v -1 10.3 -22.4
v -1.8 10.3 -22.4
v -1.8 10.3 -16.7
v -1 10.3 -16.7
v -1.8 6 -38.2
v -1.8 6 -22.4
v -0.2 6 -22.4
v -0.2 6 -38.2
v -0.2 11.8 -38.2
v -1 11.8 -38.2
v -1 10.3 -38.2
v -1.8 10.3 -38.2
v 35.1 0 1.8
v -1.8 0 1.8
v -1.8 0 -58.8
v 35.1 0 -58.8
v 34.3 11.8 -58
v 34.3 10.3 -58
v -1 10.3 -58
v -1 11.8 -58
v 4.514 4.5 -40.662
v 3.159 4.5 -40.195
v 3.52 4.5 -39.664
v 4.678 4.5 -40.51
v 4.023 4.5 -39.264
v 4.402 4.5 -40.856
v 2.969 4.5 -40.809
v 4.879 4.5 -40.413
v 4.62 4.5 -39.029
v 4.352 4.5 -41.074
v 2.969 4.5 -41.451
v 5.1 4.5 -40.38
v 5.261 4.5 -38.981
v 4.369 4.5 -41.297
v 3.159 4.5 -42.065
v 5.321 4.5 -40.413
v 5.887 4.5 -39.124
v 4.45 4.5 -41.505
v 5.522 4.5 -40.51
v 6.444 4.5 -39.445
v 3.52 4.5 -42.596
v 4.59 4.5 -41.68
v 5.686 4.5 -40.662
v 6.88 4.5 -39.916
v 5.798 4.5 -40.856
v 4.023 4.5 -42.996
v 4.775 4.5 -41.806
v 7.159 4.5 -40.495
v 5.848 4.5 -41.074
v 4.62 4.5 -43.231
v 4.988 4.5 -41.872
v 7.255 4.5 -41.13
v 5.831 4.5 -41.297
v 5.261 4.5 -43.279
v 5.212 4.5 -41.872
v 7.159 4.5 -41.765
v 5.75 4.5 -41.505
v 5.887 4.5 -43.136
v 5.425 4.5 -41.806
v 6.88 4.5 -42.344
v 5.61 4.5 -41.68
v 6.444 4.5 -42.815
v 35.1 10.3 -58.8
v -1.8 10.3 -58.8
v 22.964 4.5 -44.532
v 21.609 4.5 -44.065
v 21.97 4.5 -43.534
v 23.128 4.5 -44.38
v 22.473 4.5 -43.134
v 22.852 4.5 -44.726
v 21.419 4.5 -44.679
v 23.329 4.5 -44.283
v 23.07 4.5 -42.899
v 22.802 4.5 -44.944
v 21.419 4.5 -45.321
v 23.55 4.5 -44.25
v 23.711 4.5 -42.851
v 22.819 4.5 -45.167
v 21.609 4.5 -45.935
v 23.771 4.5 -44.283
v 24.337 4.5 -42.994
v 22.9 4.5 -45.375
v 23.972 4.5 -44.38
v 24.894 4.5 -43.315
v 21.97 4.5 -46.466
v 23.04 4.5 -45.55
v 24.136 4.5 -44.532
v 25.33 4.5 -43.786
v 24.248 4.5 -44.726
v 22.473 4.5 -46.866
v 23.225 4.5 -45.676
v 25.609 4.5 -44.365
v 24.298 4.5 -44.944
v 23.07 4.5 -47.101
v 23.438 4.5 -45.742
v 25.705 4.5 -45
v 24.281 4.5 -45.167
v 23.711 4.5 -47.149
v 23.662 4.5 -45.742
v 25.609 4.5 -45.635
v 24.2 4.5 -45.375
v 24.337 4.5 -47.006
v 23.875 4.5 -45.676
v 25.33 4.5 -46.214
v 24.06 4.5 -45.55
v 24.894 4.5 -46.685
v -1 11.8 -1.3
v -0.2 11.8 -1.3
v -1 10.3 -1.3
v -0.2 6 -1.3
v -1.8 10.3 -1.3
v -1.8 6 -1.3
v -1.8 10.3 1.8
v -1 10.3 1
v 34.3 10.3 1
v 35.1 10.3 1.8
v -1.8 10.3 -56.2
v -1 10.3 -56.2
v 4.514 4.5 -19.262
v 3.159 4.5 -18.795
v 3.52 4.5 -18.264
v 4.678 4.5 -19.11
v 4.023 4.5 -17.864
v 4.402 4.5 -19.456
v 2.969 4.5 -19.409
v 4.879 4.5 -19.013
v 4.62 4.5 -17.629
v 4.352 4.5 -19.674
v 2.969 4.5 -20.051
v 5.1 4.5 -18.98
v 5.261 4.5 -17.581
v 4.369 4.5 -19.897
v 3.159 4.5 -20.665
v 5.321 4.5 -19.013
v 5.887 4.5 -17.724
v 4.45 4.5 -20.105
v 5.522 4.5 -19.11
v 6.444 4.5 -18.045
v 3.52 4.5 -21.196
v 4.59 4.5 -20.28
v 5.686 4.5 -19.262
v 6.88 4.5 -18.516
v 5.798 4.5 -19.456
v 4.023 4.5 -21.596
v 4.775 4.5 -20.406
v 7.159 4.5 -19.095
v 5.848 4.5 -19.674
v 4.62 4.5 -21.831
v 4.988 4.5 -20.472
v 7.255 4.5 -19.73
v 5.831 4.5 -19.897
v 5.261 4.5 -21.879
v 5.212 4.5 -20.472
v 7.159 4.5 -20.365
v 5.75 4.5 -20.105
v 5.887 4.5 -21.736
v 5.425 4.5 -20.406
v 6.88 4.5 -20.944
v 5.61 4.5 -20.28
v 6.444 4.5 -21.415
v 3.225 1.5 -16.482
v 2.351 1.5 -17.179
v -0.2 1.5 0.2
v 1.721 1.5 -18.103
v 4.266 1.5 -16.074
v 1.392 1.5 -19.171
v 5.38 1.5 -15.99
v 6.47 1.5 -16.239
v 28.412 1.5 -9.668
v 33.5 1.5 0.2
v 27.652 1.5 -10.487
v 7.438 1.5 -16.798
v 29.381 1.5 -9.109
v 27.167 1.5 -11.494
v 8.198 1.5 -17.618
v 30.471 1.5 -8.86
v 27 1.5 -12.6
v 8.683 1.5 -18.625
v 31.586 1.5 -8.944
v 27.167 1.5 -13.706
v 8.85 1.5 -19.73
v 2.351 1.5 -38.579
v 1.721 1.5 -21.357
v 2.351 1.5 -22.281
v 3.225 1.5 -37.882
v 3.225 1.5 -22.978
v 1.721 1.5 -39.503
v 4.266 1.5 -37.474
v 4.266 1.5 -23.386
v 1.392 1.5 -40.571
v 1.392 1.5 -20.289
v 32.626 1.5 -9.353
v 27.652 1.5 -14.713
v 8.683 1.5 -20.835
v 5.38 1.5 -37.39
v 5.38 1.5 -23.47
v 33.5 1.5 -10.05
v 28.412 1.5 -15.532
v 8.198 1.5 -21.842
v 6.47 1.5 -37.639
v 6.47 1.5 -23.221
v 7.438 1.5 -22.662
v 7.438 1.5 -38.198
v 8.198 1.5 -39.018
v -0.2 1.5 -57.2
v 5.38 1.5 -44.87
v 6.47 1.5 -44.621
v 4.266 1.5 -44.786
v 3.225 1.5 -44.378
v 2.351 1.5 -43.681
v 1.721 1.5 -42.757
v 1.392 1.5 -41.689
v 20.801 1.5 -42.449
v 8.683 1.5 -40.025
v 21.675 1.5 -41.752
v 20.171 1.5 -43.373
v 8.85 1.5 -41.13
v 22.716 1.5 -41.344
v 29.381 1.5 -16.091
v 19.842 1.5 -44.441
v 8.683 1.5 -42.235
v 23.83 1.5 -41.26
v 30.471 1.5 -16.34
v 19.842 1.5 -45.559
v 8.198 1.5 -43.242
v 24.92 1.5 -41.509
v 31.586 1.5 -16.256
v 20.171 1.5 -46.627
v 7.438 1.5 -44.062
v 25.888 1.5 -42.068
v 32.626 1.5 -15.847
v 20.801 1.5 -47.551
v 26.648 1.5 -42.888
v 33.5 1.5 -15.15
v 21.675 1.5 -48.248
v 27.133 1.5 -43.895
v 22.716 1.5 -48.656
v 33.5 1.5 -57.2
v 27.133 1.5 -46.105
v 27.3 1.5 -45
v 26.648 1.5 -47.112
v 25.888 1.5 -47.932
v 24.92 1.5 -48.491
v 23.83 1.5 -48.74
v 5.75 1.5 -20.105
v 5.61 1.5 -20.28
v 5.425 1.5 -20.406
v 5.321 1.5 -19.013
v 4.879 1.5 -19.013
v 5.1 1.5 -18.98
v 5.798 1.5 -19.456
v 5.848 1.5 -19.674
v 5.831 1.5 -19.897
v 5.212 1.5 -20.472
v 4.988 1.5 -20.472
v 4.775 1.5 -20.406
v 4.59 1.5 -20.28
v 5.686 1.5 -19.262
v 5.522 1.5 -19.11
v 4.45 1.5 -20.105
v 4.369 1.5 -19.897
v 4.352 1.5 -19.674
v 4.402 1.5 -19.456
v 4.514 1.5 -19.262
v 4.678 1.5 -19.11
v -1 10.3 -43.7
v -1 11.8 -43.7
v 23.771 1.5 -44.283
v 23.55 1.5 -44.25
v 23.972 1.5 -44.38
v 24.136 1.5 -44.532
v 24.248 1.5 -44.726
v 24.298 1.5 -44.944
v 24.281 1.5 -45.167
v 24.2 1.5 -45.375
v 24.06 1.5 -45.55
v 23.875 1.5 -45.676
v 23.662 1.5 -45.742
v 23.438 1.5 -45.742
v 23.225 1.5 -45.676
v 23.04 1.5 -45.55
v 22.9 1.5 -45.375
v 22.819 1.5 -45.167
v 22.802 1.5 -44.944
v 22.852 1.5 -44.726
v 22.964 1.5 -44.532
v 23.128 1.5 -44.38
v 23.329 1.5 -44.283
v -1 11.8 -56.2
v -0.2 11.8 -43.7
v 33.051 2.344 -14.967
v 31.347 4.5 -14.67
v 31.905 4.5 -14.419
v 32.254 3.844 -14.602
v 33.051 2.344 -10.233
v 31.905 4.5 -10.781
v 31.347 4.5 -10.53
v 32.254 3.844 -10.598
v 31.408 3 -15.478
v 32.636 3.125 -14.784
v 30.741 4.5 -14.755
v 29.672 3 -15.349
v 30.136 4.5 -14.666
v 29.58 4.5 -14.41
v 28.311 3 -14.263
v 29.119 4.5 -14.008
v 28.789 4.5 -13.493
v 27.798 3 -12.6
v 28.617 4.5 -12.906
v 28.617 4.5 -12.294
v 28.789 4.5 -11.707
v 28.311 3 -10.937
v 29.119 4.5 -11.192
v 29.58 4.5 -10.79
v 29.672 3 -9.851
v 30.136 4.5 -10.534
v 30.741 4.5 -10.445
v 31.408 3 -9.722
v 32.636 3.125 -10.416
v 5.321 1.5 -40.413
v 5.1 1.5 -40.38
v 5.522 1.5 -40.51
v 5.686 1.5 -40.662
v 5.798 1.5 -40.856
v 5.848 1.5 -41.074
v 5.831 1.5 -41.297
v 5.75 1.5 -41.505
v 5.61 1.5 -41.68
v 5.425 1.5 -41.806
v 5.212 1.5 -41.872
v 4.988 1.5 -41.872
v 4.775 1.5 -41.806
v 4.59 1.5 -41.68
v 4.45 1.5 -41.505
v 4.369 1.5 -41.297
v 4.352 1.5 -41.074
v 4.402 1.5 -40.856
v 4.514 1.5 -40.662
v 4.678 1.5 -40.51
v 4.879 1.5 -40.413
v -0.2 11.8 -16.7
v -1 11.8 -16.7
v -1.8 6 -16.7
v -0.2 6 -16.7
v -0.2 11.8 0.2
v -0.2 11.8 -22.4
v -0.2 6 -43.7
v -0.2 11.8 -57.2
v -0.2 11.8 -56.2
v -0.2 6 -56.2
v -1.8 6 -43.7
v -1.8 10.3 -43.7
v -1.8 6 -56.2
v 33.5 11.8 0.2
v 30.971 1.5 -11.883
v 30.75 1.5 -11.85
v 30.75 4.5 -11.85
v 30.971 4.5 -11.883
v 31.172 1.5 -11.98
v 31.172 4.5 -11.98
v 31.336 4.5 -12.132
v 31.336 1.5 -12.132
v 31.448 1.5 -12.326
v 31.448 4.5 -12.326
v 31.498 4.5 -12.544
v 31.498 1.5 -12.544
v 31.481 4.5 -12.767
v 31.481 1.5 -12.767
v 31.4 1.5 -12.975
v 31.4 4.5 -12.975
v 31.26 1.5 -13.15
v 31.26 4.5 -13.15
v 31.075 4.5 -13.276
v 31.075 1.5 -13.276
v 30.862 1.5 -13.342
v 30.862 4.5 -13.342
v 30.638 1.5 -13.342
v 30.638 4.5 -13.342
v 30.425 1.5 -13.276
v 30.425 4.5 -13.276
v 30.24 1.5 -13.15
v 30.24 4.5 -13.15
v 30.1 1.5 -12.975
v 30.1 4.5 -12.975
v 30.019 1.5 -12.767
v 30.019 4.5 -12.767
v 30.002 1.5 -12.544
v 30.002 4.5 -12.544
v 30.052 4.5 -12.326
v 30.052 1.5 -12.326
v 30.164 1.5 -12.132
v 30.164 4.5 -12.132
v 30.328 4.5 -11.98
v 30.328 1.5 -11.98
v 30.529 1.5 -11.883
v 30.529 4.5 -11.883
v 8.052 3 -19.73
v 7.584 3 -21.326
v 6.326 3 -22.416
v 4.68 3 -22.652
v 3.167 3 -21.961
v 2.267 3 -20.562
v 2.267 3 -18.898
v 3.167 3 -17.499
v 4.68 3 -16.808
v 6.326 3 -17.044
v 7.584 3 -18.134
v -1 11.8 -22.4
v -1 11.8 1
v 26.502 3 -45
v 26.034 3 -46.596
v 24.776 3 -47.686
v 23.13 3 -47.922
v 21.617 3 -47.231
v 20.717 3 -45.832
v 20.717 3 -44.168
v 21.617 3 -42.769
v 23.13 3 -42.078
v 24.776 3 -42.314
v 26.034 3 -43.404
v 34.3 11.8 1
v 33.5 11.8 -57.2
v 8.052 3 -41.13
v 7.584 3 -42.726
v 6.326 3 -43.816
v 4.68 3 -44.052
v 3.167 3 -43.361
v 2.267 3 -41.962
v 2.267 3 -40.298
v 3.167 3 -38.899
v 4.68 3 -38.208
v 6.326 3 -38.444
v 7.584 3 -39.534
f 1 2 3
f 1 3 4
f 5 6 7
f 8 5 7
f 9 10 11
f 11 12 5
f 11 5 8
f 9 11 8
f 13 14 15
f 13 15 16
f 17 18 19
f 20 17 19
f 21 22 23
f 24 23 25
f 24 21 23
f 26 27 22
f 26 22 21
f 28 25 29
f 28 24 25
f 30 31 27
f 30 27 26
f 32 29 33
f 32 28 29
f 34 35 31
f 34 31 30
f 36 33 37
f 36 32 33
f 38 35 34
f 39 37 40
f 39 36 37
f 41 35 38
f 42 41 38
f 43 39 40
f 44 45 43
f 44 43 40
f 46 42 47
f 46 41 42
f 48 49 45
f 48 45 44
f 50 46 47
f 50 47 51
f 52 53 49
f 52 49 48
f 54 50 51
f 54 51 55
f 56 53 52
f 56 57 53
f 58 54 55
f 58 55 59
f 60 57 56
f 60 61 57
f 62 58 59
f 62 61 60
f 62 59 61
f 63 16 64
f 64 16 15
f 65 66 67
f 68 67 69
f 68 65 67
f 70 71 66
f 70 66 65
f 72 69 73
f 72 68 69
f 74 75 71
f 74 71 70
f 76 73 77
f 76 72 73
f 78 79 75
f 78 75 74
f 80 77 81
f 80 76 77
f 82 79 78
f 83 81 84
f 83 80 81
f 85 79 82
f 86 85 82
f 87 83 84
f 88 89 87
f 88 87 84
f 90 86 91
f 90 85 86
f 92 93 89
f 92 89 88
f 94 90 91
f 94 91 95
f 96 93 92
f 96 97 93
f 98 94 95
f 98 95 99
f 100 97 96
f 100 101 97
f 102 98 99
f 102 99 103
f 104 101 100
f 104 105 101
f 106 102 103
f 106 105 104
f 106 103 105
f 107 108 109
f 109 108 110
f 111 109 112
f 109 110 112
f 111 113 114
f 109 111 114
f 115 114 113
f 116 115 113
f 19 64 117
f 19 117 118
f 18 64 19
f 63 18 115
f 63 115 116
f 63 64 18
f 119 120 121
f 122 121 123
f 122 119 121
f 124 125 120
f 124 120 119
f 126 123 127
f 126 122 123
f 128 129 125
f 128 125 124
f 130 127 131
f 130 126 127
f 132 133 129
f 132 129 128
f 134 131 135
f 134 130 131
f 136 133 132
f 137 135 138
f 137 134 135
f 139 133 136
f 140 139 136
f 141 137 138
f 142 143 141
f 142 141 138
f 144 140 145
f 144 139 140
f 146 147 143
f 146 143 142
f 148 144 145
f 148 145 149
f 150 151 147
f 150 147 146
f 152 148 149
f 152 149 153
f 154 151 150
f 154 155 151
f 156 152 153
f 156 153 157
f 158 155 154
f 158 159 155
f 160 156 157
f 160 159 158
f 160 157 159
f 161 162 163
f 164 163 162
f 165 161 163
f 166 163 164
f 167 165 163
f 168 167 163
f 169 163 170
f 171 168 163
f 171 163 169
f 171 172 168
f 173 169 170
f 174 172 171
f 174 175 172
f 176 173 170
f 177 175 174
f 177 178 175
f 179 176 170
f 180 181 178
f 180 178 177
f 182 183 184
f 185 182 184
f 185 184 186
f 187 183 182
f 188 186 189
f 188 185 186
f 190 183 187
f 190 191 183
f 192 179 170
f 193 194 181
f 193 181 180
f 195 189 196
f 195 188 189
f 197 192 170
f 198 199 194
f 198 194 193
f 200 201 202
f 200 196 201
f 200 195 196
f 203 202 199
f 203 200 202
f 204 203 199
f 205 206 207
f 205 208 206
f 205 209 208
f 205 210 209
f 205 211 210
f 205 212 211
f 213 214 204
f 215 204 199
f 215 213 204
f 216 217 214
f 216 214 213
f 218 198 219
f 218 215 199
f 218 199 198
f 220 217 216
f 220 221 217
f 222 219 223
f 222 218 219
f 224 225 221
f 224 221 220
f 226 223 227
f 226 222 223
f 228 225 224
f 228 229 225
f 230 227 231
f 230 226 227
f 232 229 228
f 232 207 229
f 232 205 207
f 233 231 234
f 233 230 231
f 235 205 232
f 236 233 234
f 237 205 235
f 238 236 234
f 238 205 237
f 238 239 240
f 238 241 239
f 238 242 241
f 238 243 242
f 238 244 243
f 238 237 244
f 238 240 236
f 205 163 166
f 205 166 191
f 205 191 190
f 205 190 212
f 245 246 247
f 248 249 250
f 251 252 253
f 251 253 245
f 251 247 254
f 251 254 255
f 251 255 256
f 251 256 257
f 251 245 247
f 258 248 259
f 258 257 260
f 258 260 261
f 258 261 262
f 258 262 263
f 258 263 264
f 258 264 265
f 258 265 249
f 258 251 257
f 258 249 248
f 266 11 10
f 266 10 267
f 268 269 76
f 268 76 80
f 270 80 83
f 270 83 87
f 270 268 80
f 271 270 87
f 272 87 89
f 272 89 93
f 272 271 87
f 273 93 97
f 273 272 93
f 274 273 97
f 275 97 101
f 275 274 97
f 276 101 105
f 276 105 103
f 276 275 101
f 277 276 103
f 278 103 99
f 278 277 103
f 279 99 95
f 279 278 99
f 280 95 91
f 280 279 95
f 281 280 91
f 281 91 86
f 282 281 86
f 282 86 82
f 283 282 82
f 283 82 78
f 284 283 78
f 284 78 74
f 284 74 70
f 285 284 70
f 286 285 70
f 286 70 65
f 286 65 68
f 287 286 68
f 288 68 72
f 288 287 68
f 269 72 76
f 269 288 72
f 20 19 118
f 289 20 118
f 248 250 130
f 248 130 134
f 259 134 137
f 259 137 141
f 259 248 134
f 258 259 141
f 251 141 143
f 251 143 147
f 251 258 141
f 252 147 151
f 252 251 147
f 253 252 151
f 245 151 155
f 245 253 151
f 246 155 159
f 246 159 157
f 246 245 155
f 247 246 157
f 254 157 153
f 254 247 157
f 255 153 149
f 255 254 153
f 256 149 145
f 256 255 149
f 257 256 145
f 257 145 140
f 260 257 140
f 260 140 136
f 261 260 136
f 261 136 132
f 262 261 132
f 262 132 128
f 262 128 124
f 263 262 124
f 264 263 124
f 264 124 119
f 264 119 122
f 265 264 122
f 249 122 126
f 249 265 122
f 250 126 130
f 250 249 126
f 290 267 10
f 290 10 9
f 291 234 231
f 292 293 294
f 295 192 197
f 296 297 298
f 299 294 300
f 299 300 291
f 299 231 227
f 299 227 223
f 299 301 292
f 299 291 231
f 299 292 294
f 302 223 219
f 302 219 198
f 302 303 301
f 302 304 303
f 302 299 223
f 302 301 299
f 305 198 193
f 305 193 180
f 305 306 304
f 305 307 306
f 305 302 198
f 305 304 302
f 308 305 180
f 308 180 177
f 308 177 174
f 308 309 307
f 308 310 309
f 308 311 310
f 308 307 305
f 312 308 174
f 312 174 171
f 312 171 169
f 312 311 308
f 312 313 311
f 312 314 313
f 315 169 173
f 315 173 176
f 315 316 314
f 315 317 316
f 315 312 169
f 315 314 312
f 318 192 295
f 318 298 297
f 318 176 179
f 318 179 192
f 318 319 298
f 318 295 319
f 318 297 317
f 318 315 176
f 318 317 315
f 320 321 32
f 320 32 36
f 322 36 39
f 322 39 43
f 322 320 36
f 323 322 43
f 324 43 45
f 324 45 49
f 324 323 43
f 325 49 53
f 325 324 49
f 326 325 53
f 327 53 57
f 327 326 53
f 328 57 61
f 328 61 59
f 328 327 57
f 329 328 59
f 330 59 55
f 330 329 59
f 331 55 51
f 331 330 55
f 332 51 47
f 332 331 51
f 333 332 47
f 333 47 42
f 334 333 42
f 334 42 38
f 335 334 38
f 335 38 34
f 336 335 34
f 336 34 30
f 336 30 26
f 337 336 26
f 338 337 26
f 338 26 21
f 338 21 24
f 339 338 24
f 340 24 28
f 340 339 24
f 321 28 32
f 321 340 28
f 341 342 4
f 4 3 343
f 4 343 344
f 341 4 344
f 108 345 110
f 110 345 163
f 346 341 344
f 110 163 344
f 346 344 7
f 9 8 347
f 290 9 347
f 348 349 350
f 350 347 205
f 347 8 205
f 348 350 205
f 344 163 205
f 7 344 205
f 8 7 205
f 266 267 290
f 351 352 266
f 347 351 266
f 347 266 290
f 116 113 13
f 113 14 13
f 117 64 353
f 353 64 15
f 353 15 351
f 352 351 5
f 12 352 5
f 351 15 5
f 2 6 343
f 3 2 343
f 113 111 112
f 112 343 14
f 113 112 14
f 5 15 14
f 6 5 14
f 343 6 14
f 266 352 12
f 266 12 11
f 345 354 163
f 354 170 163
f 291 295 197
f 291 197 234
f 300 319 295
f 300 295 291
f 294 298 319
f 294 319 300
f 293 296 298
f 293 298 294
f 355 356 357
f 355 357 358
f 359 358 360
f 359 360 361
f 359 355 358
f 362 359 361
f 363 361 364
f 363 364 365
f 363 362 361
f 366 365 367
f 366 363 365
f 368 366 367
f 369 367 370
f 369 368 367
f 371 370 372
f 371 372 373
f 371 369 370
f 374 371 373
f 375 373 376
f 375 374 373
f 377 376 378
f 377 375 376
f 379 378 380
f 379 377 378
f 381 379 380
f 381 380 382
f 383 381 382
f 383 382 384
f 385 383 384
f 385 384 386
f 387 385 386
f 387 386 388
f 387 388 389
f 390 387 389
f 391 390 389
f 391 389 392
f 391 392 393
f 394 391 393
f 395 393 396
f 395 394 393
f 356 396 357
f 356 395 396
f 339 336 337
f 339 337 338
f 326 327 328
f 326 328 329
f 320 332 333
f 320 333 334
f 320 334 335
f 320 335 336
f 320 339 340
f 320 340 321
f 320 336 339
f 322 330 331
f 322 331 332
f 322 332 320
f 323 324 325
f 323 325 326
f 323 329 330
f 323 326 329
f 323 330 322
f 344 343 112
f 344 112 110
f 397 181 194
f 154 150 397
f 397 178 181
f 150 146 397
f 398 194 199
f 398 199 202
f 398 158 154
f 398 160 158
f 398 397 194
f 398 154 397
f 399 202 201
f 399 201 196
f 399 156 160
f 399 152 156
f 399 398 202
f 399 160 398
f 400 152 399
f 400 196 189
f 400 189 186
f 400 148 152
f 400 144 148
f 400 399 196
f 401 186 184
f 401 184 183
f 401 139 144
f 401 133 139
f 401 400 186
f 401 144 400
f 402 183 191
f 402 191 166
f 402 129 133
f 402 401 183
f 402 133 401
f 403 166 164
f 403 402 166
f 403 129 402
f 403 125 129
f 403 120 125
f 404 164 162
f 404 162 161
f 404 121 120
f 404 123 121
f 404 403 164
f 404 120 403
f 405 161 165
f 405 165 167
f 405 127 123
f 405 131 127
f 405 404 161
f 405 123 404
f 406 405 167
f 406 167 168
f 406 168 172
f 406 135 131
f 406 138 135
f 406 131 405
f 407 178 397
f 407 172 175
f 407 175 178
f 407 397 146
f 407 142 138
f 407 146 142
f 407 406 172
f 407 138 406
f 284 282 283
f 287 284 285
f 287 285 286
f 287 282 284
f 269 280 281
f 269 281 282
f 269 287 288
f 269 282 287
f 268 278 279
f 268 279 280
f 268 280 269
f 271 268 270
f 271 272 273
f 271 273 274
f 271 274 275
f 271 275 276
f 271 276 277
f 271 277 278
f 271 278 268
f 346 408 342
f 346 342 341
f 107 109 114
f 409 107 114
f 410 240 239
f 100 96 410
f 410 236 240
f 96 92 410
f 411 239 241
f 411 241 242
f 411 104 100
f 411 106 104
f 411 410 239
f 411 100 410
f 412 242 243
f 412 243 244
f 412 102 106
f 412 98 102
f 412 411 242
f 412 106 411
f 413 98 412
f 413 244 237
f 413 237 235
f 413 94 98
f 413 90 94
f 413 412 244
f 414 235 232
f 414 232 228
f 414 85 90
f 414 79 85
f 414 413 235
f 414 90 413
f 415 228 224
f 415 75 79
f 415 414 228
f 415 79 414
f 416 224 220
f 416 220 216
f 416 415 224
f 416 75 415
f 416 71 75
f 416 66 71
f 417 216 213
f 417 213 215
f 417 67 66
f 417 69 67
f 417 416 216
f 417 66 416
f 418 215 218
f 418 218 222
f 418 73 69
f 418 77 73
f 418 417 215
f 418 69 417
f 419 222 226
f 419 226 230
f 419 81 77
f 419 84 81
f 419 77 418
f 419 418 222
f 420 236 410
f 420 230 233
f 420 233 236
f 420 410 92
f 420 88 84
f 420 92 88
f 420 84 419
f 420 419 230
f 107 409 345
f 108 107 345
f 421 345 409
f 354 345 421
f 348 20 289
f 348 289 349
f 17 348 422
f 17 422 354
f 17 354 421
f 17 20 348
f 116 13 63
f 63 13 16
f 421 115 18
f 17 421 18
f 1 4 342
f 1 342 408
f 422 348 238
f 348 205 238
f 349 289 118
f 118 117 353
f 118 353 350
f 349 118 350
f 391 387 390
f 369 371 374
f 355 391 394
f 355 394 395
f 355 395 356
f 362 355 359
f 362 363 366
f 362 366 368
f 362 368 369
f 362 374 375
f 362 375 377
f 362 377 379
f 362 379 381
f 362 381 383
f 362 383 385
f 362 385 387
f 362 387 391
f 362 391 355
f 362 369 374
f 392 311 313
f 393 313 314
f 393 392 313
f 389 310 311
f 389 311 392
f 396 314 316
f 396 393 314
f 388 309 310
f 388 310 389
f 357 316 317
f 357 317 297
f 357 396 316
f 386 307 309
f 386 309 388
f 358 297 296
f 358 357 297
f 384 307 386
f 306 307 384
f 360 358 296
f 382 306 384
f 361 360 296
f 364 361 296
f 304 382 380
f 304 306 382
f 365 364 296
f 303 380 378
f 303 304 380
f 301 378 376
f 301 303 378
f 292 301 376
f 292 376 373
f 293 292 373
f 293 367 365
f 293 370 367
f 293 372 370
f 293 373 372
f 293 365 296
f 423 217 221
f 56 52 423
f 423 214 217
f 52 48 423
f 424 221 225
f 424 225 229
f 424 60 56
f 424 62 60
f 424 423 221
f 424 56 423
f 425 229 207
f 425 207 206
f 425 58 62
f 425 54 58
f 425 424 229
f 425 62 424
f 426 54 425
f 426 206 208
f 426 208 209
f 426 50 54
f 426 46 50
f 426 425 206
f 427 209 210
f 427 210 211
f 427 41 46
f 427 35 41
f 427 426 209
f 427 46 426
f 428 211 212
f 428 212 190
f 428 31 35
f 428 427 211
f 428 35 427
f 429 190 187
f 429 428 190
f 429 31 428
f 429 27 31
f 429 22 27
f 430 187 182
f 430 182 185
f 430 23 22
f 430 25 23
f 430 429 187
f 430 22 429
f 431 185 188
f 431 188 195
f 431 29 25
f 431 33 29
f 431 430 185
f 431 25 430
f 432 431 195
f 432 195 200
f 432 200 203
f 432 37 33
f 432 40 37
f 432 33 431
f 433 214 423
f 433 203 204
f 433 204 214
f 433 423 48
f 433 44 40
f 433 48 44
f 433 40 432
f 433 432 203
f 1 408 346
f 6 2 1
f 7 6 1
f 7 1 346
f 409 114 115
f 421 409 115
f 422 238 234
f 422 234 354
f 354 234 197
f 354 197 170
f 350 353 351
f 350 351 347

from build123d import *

# Parameters (mm, degrees)
SKETCH_2_W            = 36.9
SKETCH_2_H            = 60.6
SKETCH_2_W_2          = 33.7
SKETCH_2_H_2          = 57.4
SKETCH_2_R            = 3.75
SKETCH_2_R_2          = 2.25
SKETCH_2_R_3          = 0.75
EXTRUDE_1_DEPTH       = 1.5
EXTRUDE_2_OUTLINE_R   = 2.154871705
EXTRUDE_2_DEPTH       = 3
EXTRUDE_2_DRAFT       = 28
EXTRUDE_2_2_OUTLINE_R = 2.154871705
EXTRUDE_2_2_DEPTH     = 3
EXTRUDE_2_2_DRAFT     = 28
EXTRUDE_2_3_DEPTH     = 3
EXTRUDE_2_3_DRAFT     = 28
EXTRUDE_2_4_OUTLINE_R = 2.154871705
EXTRUDE_2_4_DEPTH     = 3
EXTRUDE_2_4_DRAFT     = 28
EXTRUDE_START         = 1.5
SKETCH_2_11_W         = 36.9
SKETCH_2_11_H         = 60.6
SKETCH_2_11_W_2       = 33.7
SKETCH_2_11_H_2       = 57.4
EXTRUDE_3_DEPTH       = 4.5
SKETCH_3_W            = 1.6
SKETCH_3_H            = 5.7
SKETCH_3_H_2          = 5.5
EXTRUDE_4_DEPTH       = 4.3
SKETCH_5_W            = 0.8
SKETCH_5_H            = 5.5
SKETCH_5_H_2          = 5.7
EXTRUDE_5_DEPTH       = 1.5
CUT_EXTRUDE_START     = 1.5
SKETCH_2_12_R         = 0.75
CUT_EXTRUDE_1_DEPTH   = 3


# Read off the part's stored shape, not the designer's step: Бобышка-Вытянуть2
with BuildPart() as part:
    # Эскиз2 → Бобышка-Вытянуть1 (new body)
    # profile 1 of 14: a face of its own
    with BuildSketch(Plane(origin=(0, 0, 0), x_dir=(1, 0, 0), z_dir=(0, 1, 0))):
        with Locations((16.65, 28.5)):
            Rectangle(SKETCH_2_W, SKETCH_2_H)
        with Locations((16.65, 28.5)):
            Rectangle(SKETCH_2_W_2, SKETCH_2_H_2, mode=Mode.SUBTRACT)
    # profile 2 of 14: a face of its own
    with BuildSketch(Plane(origin=(0, 0, 0), x_dir=(1, 0, 0), z_dir=(0, 1, 0))):
        with BuildLine():
            Line((-0.2, 57.2), (-0.2, -0.2))
            Line((-0.2, -0.2), (33.5, -0.2))
            Line((33.5, -0.2), (33.5, 10.050490243))
            ThreePointArc((33.5, 10.050490243), (27, 12.6), (33.5, 15.149509757))
            Line((33.5, 15.149509757), (33.5, 57.2))
            Line((33.5, 57.2), (-0.2, 57.2))
        make_face()
        with Locations((5.1, 19.73)):
            Circle(SKETCH_2_R, mode=Mode.SUBTRACT)
        with Locations((5.1, 41.13)):
            Circle(SKETCH_2_R, mode=Mode.SUBTRACT)
        with Locations((23.55, 45)):
            Circle(SKETCH_2_R, mode=Mode.SUBTRACT)
    # profile 3 of 14: a face of its own
    with BuildSketch(Plane(origin=(0, 0, 0), x_dir=(1, 0, 0), z_dir=(0, 1, 0))):
        with Locations((23.55, 45)):
            Circle(SKETCH_2_R)
        with Locations((23.55, 45)):
            Circle(SKETCH_2_R_2, mode=Mode.SUBTRACT)
    # profile 4 of 14: a face of its own
    with BuildSketch(Plane(origin=(0, 0, 0), x_dir=(1, 0, 0), z_dir=(0, 1, 0))):
        with Locations((23.55, 45)):
            Circle(SKETCH_2_R_2)
        with Locations((23.55, 45)):
            Circle(SKETCH_2_R_3, mode=Mode.SUBTRACT)
    # profile 5 of 14: a face of its own
    with BuildSketch(Plane(origin=(0, 0, 0), x_dir=(1, 0, 0), z_dir=(0, 1, 0))):
        with Locations((23.55, 45)):
            Circle(SKETCH_2_R_3)
    # profile 6 of 14: a face of its own
    with BuildSketch(Plane(origin=(0, 0, 0), x_dir=(1, 0, 0), z_dir=(0, 1, 0))):
        with Locations((5.1, 41.13)):
            Circle(SKETCH_2_R)
        with Locations((5.1, 41.13)):
            Circle(SKETCH_2_R_2, mode=Mode.SUBTRACT)
    # profile 7 of 14: a face of its own
    with BuildSketch(Plane(origin=(0, 0, 0), x_dir=(1, 0, 0), z_dir=(0, 1, 0))):
        with Locations((5.1, 41.13)):
            Circle(SKETCH_2_R_2)
        with Locations((5.1, 41.13)):
            Circle(SKETCH_2_R_3, mode=Mode.SUBTRACT)
    # profile 8 of 14: a face of its own
    with BuildSketch(Plane(origin=(0, 0, 0), x_dir=(1, 0, 0), z_dir=(0, 1, 0))):
        with Locations((5.1, 41.13)):
            Circle(SKETCH_2_R_3)
    # profile 9 of 14: a face of its own
    with BuildSketch(Plane(origin=(0, 0, 0), x_dir=(1, 0, 0), z_dir=(0, 1, 0))):
        with Locations((5.1, 19.73)):
            Circle(SKETCH_2_R)
        with Locations((5.1, 19.73)):
            Circle(SKETCH_2_R_2, mode=Mode.SUBTRACT)
    # profile 10 of 14: a face of its own
    with BuildSketch(Plane(origin=(0, 0, 0), x_dir=(1, 0, 0), z_dir=(0, 1, 0))):
        with Locations((5.1, 19.73)):
            Circle(SKETCH_2_R_2)
        with Locations((5.1, 19.73)):
            Circle(SKETCH_2_R_3, mode=Mode.SUBTRACT)
    # profile 11 of 14: a face of its own
    with BuildSketch(Plane(origin=(0, 0, 0), x_dir=(1, 0, 0), z_dir=(0, 1, 0))):
        with Locations((5.1, 19.73)):
            Circle(SKETCH_2_R_3)
    # profile 12 of 14: a face of its own
    with BuildSketch(Plane(origin=(0, 0, 0), x_dir=(1, 0, 0), z_dir=(0, 1, 0))):
        with BuildLine():
            ThreePointArc((33.5, 15.149509757), (27, 12.6), (33.5, 10.050490243))
            Line((33.5, 10.050490243), (33.5, 15.149509757))
        make_face()
        with Locations((30.75, 12.6)):
            Circle(SKETCH_2_R_2, mode=Mode.SUBTRACT)
    # profile 13 of 14: a face of its own
    with BuildSketch(Plane(origin=(0, 0, 0), x_dir=(1, 0, 0), z_dir=(0, 1, 0))):
        with Locations((30.75, 12.6)):
            Circle(SKETCH_2_R_2)
        with Locations((30.75, 12.6)):
            Circle(SKETCH_2_R_3, mode=Mode.SUBTRACT)
    # profile 14 of 14: a face of its own
    with BuildSketch(Plane(origin=(0, 0, 0), x_dir=(1, 0, 0), z_dir=(0, 1, 0))):
        with Locations((30.75, 12.6)):
            Circle(SKETCH_2_R_3)
    extrude(amount=EXTRUDE_1_DEPTH)


with BuildPart() as extrude_2_tool:
    # Бобышка-Вытянуть2 outline → Бобышка-Вытянуть2 (with draft: the straight prism first)
    with BuildSketch(Plane(origin=(0, 4.5, 0), x_dir=(1, 0, 0), z_dir=(0, 1, 0))):
        with Locations((5.1, 41.13)):
            Circle(EXTRUDE_2_OUTLINE_R)
    extrude(amount=-EXTRUDE_2_DEPTH)
    # Бобышка-Вытянуть2: the draft: its side faces are tilted about the plane it starts from
    extrude_2_sides = [extrude_2_tool.faces().sort_by_distance(p)[0] for p in [
        (2.945128295, 3, -41.13),
    ]]
    draft(extrude_2_sides, Plane(origin=(0, 4.5, 0), x_dir=(1, 0, 0), z_dir=(0, 1, 0)), EXTRUDE_2_DRAFT)


with BuildPart() as part_1:
    add(part.part)

    # Бобышка-Вытянуть2: add extrude_2_tool
    add(extrude_2_tool.part)


with BuildPart() as extrude_2_2_tool:
    # Extrude 2 2 outline → Extrude 2 2 (with draft: the straight prism first)
    with BuildSketch(Plane(origin=(0, 4.5, 0), x_dir=(1, 0, 0), z_dir=(0, 1, 0))):
        with Locations((23.55, 45)):
            Circle(EXTRUDE_2_2_OUTLINE_R)
    extrude(amount=-EXTRUDE_2_2_DEPTH)
    # Extrude 2 2: the draft: its side faces are tilted about the plane it starts from
    extrude_2_2_sides = [extrude_2_2_tool.faces().sort_by_distance(p)[0] for p in [
        (21.395128295, 3, -45),
    ]]
    draft(extrude_2_2_sides, Plane(origin=(0, 4.5, 0), x_dir=(1, 0, 0), z_dir=(0, 1, 0)), EXTRUDE_2_2_DRAFT)


with BuildPart() as part_2:
    add(part_1.part)

    # Extrude 2 2: add extrude_2_2_tool
    add(extrude_2_2_tool.part)


with BuildPart() as extrude_2_3_tool:
    # Extrude 2 3 outline → Extrude 2 3 (with draft: the straight prism first)
    with BuildSketch(Plane(origin=(0, 4.5, 0), x_dir=(1, 0, 0), z_dir=(0, 1, 0))):
        with BuildLine():
            ThreePointArc((31.904871705, 14.419270021), (28.595128295, 12.6), (31.904871705, 10.780729979))
            Line((31.904871705, 10.780729979), (31.904871705, 14.419270021))
        make_face()
    extrude(amount=-EXTRUDE_2_3_DEPTH)
    # Extrude 2 3: the draft: its side faces are tilted about the plane it starts from
    extrude_2_3_sides = [extrude_2_3_tool.faces().sort_by_distance(p)[0] for p in [
        (28.595128295, 3, -12.6),
        (31.904871705, 3, -12.6),
    ]]
    draft(extrude_2_3_sides, Plane(origin=(0, 4.5, 0), x_dir=(1, 0, 0), z_dir=(0, 1, 0)), EXTRUDE_2_3_DRAFT)


with BuildPart() as part_3:
    add(part_2.part)

    # Extrude 2 3: add extrude_2_3_tool
    add(extrude_2_3_tool.part)


with BuildPart() as extrude_2_4_tool:
    # Extrude 2 4 outline → Extrude 2 4 (with draft: the straight prism first)
    with BuildSketch(Plane(origin=(0, 4.5, 0), x_dir=(1, 0, 0), z_dir=(0, 1, 0))):
        with Locations((5.1, 19.73)):
            Circle(EXTRUDE_2_4_OUTLINE_R)
    extrude(amount=-EXTRUDE_2_4_DEPTH)
    # Extrude 2 4: the draft: its side faces are tilted about the plane it starts from
    extrude_2_4_sides = [extrude_2_4_tool.faces().sort_by_distance(p)[0] for p in [
        (2.945128295, 3, -19.73),
    ]]
    draft(extrude_2_4_sides, Plane(origin=(0, 4.5, 0), x_dir=(1, 0, 0), z_dir=(0, 1, 0)), EXTRUDE_2_4_DRAFT)


with BuildPart() as part_4:
    add(part_3.part)

    # Extrude 2 4: add extrude_2_4_tool
    add(extrude_2_4_tool.part)

    # Эскиз2<11> → Бобышка-Вытянуть3 (add)
    with BuildSketch(Plane(origin=(0, 0, 0), x_dir=(1, 0, 0), z_dir=(0, 1, 0)).offset(EXTRUDE_START)):
        with Locations((16.65, 28.5)):
            Rectangle(SKETCH_2_11_W, SKETCH_2_11_H)
        with Locations((16.65, 28.5)):
            Rectangle(SKETCH_2_11_W_2, SKETCH_2_11_H_2, mode=Mode.SUBTRACT)
    extrude(amount=EXTRUDE_3_DEPTH)

    # Эскиз3 → Бобышка-Вытянуть4 (add)
    with BuildSketch(Plane(origin=(0, 6, 0), x_dir=(1, 0, 0), z_dir=(0, 1, 0))):
        Polygon((-0.2, 1.3), (-1.8, 1.3), (-1.8, -1.8), (35.1, -1.8), (35.1, 58.8), (-1.8, 58.8), (-1.8, 56.2), (-0.2, 56.2), (-0.2, 57.2), (33.5, 57.2), (33.5, -0.2), (-0.2, -0.2), align=None)
        with Locations((-1, 19.55)):
            Rectangle(SKETCH_3_W, SKETCH_3_H)
        with Locations((-1, 40.95)):
            Rectangle(SKETCH_3_W, SKETCH_3_H_2)
    extrude(amount=EXTRUDE_4_DEPTH)

    # Эскиз5 → Бобышка-Вытянуть5 (add)
    with BuildSketch(Plane(origin=(0, 10.3, 0), x_dir=(1, 0, 0), z_dir=(0, 1, 0))):
        Polygon((-1, -1), (34.3, -1), (34.3, 58), (-1, 58), (-1, 56.2), (-0.2, 56.2), (-0.2, 57.2), (33.5, 57.2), (33.5, -0.2), (-0.2, -0.2), (-0.2, 1.3), (-1, 1.3), align=None)
        with Locations((-0.6, 40.95)):
            Rectangle(SKETCH_5_W, SKETCH_5_H)
        with Locations((-0.6, 19.55)):
            Rectangle(SKETCH_5_W, SKETCH_5_H_2)
    extrude(amount=EXTRUDE_5_DEPTH)

    # Эскиз2<12> → Вырез-Вытянуть1 (cut)
    with BuildSketch(Plane(origin=(0, 0, 0), x_dir=(1, 0, 0), z_dir=(0, 1, 0)).offset(CUT_EXTRUDE_START)):
        with Locations(Location((23.55, 45, 0), (0, 0, 270))):
            Circle(SKETCH_2_12_R)
        with Locations(Location((5.1, 41.13, 0), (0, 0, 270))):
            Circle(SKETCH_2_12_R)
        with Locations(Location((5.1, 19.73, 0), (0, 0, 270))):
            Circle(SKETCH_2_12_R)
        with Locations(Location((30.75, 12.6, 0), (0, 0, 270))):
            Circle(SKETCH_2_12_R)
    extrude(amount=CUT_EXTRUDE_1_DEPTH, mode=Mode.SUBTRACT)


solid = part_4.part
